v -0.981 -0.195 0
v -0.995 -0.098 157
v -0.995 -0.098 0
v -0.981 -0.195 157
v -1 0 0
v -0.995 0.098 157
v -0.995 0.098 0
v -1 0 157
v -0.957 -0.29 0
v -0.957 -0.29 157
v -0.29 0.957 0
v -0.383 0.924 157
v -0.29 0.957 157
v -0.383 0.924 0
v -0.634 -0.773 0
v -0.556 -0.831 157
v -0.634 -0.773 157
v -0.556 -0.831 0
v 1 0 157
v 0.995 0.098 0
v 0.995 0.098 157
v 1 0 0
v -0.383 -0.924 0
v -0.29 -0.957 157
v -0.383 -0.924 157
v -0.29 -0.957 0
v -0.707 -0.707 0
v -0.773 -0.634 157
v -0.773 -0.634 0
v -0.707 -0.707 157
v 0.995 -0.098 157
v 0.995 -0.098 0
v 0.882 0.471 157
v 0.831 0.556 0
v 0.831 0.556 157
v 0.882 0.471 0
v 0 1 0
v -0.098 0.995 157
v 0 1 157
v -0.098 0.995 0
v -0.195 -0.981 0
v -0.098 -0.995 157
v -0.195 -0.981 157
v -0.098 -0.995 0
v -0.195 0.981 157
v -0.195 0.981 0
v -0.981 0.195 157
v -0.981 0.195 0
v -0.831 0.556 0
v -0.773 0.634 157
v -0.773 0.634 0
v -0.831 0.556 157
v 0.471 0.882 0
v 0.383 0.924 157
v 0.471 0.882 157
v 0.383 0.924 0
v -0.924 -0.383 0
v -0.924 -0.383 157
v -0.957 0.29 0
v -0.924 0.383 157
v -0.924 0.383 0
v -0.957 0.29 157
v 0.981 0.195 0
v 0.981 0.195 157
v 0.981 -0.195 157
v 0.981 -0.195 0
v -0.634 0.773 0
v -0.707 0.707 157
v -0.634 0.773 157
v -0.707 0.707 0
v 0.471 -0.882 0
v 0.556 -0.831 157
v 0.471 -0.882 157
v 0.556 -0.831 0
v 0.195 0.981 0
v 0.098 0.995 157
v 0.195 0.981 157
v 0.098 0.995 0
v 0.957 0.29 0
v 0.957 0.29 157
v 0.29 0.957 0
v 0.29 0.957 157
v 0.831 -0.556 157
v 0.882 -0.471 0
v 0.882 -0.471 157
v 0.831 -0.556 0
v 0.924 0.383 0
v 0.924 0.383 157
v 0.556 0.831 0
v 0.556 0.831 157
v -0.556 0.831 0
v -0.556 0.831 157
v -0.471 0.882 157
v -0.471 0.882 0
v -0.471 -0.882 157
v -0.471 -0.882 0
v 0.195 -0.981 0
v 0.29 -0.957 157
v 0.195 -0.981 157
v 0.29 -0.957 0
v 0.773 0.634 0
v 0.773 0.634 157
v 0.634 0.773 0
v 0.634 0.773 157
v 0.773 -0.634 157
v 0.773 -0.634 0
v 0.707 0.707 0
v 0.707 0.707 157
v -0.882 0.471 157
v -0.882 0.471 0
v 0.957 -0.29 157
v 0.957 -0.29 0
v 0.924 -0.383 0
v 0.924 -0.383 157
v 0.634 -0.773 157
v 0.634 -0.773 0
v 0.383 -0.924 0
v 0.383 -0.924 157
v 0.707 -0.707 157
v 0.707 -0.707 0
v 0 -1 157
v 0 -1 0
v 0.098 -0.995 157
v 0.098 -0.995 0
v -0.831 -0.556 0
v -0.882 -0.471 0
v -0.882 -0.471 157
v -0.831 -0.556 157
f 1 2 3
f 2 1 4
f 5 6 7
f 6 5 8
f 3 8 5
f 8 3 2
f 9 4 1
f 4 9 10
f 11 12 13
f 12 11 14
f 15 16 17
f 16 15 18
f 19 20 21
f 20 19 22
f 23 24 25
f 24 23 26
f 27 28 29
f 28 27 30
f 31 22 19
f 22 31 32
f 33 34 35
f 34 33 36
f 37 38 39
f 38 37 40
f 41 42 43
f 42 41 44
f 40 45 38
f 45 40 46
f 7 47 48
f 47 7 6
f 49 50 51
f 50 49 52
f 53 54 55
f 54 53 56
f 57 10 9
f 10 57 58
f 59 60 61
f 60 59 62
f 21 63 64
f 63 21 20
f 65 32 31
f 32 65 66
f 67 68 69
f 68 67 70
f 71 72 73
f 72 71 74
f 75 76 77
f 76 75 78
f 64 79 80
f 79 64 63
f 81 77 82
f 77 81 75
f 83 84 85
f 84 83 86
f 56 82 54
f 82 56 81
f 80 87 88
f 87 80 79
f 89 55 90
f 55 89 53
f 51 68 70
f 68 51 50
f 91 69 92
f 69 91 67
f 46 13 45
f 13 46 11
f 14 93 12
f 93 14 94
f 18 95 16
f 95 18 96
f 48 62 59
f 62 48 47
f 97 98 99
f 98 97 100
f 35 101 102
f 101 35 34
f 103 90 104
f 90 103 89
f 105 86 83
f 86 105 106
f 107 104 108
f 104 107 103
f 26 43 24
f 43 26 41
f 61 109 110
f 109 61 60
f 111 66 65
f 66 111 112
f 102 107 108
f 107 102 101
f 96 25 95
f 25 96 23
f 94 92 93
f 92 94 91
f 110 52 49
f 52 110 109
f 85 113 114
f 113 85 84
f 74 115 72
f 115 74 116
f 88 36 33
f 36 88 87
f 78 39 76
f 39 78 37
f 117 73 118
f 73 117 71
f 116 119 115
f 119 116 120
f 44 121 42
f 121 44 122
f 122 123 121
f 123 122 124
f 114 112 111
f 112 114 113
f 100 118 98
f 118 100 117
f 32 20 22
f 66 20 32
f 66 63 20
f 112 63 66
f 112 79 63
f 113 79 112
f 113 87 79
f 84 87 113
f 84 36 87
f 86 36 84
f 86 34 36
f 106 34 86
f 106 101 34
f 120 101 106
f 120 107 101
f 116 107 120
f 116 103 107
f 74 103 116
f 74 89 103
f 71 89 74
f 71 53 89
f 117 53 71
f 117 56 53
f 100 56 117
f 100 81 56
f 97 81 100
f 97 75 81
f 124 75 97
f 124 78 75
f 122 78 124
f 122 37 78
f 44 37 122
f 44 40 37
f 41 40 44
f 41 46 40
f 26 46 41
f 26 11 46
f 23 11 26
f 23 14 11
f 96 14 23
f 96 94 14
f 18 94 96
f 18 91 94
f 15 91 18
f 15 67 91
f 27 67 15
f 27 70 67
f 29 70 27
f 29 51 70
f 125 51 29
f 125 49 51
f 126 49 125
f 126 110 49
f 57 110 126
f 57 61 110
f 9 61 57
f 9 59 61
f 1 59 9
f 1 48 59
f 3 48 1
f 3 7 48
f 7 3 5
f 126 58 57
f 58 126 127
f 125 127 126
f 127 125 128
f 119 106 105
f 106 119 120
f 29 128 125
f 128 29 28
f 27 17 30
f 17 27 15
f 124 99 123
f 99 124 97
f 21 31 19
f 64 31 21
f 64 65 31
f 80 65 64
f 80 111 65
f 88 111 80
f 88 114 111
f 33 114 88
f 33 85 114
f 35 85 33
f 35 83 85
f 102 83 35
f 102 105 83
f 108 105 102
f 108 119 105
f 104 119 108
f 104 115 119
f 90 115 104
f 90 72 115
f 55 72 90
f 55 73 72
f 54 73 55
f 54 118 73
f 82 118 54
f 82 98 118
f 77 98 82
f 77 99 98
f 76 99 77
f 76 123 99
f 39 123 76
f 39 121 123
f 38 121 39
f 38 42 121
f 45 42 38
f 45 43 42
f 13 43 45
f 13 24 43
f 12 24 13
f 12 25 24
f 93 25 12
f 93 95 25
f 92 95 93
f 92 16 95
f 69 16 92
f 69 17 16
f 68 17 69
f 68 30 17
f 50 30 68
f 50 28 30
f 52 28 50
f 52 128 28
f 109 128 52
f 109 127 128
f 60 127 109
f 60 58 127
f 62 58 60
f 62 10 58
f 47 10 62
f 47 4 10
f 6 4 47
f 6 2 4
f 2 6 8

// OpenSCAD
// file: modules/stadium.scad
// Stadium (rounded rectangle) 2D shape.
// Centered at origin. r = corner radius.
module stadium(w, d, r) {
    cr = min(r, min(w, d) / 2);
    dx = w/2 - cr;
    dy = d/2 - cr;
    hull() {
        translate([-dx, -dy]) circle(r=cr);
        translate([ dx, -dy]) circle(r=cr);
        translate([-dx,  dy]) circle(r=cr);
        translate([ dx,  dy]) circle(r=cr);
    }
}
// main file
// Makeup Organizer — Cup
// Removable insert with configurable height and divider grid.
// Self-contained: no external dependencies.

$fn = 64;
use <modules/stadium.scad>

/* ===================== CONFIGURE HERE ===================== */
cup_floors  = 3;        // height in F units (1F = 49mm)
cup_rows    = 3;        // divider rows (along depth)
cup_cols    = 2;        // divider columns (along width)
/* ========================================================== */

/* --- Gridfinity base --- */
grid_pitch  = 42;
grid_clear  = 0.5;
F           = 49;       // height unit = 7 × 7mm gridfinity heights

function grid_size(n) = n * grid_pitch - grid_clear;

/* --- Cup footprint (2×4 gridfinity units) --- */
cup_grid_w   = 2;
cup_grid_d   = 4;
decor_budget = 5;
wall_t       = 1.2;
cup_wall     = 2.5;
cup_base_t   = 1.5;
cup_extra_h  = 10;      // lip that sticks out above tray

cup_w   = grid_size(cup_grid_w) - 2*decor_budget - 2*wall_t;  // 71.1mm
cup_d   = grid_size(cup_grid_d) - 2*decor_budget - 2*wall_t;  // 155.1mm
end_r   = cup_w / 2;

/* --- Derived --- */
cup_h   = cup_floors * F + cup_extra_h;
inner_w = cup_w - 2*cup_wall;
inner_d = cup_d - 2*cup_wall;

/* --- Cup body --- */
module cup_body() {
    difference() {
        linear_extrude(cup_h)
            stadium(cup_w, cup_d);
        translate([0, 0, cup_base_t])
            linear_extrude(cup_h)
                stadium(inner_w, inner_d);
    }
    intersection() {
        translate([0, 0, cup_base_t])
            linear_extrude(cup_h - cup_base_t)
                stadium(inner_w, inner_d);
        union() {
            if (cup_cols > 1)
                for (i = [1:cup_cols-1]) {
                    x = -inner_w/2 + i * inner_w/cup_cols;
                    translate([x, 0, cup_base_t])
                        linear_extrude(cup_h - cup_base_t)
                            square([cup_wall, inner_d], center=true);
                }
            if (cup_rows > 1)
                for (i = [1:cup_rows-1]) {
                    y = -inner_d/2 + i * inner_d/cup_rows;
                    translate([0, y, cup_base_t])
                        linear_extrude(cup_h - cup_base_t)
                            square([inner_w, cup_wall], center=true);
                }
        }
    }
}

cup_body();
